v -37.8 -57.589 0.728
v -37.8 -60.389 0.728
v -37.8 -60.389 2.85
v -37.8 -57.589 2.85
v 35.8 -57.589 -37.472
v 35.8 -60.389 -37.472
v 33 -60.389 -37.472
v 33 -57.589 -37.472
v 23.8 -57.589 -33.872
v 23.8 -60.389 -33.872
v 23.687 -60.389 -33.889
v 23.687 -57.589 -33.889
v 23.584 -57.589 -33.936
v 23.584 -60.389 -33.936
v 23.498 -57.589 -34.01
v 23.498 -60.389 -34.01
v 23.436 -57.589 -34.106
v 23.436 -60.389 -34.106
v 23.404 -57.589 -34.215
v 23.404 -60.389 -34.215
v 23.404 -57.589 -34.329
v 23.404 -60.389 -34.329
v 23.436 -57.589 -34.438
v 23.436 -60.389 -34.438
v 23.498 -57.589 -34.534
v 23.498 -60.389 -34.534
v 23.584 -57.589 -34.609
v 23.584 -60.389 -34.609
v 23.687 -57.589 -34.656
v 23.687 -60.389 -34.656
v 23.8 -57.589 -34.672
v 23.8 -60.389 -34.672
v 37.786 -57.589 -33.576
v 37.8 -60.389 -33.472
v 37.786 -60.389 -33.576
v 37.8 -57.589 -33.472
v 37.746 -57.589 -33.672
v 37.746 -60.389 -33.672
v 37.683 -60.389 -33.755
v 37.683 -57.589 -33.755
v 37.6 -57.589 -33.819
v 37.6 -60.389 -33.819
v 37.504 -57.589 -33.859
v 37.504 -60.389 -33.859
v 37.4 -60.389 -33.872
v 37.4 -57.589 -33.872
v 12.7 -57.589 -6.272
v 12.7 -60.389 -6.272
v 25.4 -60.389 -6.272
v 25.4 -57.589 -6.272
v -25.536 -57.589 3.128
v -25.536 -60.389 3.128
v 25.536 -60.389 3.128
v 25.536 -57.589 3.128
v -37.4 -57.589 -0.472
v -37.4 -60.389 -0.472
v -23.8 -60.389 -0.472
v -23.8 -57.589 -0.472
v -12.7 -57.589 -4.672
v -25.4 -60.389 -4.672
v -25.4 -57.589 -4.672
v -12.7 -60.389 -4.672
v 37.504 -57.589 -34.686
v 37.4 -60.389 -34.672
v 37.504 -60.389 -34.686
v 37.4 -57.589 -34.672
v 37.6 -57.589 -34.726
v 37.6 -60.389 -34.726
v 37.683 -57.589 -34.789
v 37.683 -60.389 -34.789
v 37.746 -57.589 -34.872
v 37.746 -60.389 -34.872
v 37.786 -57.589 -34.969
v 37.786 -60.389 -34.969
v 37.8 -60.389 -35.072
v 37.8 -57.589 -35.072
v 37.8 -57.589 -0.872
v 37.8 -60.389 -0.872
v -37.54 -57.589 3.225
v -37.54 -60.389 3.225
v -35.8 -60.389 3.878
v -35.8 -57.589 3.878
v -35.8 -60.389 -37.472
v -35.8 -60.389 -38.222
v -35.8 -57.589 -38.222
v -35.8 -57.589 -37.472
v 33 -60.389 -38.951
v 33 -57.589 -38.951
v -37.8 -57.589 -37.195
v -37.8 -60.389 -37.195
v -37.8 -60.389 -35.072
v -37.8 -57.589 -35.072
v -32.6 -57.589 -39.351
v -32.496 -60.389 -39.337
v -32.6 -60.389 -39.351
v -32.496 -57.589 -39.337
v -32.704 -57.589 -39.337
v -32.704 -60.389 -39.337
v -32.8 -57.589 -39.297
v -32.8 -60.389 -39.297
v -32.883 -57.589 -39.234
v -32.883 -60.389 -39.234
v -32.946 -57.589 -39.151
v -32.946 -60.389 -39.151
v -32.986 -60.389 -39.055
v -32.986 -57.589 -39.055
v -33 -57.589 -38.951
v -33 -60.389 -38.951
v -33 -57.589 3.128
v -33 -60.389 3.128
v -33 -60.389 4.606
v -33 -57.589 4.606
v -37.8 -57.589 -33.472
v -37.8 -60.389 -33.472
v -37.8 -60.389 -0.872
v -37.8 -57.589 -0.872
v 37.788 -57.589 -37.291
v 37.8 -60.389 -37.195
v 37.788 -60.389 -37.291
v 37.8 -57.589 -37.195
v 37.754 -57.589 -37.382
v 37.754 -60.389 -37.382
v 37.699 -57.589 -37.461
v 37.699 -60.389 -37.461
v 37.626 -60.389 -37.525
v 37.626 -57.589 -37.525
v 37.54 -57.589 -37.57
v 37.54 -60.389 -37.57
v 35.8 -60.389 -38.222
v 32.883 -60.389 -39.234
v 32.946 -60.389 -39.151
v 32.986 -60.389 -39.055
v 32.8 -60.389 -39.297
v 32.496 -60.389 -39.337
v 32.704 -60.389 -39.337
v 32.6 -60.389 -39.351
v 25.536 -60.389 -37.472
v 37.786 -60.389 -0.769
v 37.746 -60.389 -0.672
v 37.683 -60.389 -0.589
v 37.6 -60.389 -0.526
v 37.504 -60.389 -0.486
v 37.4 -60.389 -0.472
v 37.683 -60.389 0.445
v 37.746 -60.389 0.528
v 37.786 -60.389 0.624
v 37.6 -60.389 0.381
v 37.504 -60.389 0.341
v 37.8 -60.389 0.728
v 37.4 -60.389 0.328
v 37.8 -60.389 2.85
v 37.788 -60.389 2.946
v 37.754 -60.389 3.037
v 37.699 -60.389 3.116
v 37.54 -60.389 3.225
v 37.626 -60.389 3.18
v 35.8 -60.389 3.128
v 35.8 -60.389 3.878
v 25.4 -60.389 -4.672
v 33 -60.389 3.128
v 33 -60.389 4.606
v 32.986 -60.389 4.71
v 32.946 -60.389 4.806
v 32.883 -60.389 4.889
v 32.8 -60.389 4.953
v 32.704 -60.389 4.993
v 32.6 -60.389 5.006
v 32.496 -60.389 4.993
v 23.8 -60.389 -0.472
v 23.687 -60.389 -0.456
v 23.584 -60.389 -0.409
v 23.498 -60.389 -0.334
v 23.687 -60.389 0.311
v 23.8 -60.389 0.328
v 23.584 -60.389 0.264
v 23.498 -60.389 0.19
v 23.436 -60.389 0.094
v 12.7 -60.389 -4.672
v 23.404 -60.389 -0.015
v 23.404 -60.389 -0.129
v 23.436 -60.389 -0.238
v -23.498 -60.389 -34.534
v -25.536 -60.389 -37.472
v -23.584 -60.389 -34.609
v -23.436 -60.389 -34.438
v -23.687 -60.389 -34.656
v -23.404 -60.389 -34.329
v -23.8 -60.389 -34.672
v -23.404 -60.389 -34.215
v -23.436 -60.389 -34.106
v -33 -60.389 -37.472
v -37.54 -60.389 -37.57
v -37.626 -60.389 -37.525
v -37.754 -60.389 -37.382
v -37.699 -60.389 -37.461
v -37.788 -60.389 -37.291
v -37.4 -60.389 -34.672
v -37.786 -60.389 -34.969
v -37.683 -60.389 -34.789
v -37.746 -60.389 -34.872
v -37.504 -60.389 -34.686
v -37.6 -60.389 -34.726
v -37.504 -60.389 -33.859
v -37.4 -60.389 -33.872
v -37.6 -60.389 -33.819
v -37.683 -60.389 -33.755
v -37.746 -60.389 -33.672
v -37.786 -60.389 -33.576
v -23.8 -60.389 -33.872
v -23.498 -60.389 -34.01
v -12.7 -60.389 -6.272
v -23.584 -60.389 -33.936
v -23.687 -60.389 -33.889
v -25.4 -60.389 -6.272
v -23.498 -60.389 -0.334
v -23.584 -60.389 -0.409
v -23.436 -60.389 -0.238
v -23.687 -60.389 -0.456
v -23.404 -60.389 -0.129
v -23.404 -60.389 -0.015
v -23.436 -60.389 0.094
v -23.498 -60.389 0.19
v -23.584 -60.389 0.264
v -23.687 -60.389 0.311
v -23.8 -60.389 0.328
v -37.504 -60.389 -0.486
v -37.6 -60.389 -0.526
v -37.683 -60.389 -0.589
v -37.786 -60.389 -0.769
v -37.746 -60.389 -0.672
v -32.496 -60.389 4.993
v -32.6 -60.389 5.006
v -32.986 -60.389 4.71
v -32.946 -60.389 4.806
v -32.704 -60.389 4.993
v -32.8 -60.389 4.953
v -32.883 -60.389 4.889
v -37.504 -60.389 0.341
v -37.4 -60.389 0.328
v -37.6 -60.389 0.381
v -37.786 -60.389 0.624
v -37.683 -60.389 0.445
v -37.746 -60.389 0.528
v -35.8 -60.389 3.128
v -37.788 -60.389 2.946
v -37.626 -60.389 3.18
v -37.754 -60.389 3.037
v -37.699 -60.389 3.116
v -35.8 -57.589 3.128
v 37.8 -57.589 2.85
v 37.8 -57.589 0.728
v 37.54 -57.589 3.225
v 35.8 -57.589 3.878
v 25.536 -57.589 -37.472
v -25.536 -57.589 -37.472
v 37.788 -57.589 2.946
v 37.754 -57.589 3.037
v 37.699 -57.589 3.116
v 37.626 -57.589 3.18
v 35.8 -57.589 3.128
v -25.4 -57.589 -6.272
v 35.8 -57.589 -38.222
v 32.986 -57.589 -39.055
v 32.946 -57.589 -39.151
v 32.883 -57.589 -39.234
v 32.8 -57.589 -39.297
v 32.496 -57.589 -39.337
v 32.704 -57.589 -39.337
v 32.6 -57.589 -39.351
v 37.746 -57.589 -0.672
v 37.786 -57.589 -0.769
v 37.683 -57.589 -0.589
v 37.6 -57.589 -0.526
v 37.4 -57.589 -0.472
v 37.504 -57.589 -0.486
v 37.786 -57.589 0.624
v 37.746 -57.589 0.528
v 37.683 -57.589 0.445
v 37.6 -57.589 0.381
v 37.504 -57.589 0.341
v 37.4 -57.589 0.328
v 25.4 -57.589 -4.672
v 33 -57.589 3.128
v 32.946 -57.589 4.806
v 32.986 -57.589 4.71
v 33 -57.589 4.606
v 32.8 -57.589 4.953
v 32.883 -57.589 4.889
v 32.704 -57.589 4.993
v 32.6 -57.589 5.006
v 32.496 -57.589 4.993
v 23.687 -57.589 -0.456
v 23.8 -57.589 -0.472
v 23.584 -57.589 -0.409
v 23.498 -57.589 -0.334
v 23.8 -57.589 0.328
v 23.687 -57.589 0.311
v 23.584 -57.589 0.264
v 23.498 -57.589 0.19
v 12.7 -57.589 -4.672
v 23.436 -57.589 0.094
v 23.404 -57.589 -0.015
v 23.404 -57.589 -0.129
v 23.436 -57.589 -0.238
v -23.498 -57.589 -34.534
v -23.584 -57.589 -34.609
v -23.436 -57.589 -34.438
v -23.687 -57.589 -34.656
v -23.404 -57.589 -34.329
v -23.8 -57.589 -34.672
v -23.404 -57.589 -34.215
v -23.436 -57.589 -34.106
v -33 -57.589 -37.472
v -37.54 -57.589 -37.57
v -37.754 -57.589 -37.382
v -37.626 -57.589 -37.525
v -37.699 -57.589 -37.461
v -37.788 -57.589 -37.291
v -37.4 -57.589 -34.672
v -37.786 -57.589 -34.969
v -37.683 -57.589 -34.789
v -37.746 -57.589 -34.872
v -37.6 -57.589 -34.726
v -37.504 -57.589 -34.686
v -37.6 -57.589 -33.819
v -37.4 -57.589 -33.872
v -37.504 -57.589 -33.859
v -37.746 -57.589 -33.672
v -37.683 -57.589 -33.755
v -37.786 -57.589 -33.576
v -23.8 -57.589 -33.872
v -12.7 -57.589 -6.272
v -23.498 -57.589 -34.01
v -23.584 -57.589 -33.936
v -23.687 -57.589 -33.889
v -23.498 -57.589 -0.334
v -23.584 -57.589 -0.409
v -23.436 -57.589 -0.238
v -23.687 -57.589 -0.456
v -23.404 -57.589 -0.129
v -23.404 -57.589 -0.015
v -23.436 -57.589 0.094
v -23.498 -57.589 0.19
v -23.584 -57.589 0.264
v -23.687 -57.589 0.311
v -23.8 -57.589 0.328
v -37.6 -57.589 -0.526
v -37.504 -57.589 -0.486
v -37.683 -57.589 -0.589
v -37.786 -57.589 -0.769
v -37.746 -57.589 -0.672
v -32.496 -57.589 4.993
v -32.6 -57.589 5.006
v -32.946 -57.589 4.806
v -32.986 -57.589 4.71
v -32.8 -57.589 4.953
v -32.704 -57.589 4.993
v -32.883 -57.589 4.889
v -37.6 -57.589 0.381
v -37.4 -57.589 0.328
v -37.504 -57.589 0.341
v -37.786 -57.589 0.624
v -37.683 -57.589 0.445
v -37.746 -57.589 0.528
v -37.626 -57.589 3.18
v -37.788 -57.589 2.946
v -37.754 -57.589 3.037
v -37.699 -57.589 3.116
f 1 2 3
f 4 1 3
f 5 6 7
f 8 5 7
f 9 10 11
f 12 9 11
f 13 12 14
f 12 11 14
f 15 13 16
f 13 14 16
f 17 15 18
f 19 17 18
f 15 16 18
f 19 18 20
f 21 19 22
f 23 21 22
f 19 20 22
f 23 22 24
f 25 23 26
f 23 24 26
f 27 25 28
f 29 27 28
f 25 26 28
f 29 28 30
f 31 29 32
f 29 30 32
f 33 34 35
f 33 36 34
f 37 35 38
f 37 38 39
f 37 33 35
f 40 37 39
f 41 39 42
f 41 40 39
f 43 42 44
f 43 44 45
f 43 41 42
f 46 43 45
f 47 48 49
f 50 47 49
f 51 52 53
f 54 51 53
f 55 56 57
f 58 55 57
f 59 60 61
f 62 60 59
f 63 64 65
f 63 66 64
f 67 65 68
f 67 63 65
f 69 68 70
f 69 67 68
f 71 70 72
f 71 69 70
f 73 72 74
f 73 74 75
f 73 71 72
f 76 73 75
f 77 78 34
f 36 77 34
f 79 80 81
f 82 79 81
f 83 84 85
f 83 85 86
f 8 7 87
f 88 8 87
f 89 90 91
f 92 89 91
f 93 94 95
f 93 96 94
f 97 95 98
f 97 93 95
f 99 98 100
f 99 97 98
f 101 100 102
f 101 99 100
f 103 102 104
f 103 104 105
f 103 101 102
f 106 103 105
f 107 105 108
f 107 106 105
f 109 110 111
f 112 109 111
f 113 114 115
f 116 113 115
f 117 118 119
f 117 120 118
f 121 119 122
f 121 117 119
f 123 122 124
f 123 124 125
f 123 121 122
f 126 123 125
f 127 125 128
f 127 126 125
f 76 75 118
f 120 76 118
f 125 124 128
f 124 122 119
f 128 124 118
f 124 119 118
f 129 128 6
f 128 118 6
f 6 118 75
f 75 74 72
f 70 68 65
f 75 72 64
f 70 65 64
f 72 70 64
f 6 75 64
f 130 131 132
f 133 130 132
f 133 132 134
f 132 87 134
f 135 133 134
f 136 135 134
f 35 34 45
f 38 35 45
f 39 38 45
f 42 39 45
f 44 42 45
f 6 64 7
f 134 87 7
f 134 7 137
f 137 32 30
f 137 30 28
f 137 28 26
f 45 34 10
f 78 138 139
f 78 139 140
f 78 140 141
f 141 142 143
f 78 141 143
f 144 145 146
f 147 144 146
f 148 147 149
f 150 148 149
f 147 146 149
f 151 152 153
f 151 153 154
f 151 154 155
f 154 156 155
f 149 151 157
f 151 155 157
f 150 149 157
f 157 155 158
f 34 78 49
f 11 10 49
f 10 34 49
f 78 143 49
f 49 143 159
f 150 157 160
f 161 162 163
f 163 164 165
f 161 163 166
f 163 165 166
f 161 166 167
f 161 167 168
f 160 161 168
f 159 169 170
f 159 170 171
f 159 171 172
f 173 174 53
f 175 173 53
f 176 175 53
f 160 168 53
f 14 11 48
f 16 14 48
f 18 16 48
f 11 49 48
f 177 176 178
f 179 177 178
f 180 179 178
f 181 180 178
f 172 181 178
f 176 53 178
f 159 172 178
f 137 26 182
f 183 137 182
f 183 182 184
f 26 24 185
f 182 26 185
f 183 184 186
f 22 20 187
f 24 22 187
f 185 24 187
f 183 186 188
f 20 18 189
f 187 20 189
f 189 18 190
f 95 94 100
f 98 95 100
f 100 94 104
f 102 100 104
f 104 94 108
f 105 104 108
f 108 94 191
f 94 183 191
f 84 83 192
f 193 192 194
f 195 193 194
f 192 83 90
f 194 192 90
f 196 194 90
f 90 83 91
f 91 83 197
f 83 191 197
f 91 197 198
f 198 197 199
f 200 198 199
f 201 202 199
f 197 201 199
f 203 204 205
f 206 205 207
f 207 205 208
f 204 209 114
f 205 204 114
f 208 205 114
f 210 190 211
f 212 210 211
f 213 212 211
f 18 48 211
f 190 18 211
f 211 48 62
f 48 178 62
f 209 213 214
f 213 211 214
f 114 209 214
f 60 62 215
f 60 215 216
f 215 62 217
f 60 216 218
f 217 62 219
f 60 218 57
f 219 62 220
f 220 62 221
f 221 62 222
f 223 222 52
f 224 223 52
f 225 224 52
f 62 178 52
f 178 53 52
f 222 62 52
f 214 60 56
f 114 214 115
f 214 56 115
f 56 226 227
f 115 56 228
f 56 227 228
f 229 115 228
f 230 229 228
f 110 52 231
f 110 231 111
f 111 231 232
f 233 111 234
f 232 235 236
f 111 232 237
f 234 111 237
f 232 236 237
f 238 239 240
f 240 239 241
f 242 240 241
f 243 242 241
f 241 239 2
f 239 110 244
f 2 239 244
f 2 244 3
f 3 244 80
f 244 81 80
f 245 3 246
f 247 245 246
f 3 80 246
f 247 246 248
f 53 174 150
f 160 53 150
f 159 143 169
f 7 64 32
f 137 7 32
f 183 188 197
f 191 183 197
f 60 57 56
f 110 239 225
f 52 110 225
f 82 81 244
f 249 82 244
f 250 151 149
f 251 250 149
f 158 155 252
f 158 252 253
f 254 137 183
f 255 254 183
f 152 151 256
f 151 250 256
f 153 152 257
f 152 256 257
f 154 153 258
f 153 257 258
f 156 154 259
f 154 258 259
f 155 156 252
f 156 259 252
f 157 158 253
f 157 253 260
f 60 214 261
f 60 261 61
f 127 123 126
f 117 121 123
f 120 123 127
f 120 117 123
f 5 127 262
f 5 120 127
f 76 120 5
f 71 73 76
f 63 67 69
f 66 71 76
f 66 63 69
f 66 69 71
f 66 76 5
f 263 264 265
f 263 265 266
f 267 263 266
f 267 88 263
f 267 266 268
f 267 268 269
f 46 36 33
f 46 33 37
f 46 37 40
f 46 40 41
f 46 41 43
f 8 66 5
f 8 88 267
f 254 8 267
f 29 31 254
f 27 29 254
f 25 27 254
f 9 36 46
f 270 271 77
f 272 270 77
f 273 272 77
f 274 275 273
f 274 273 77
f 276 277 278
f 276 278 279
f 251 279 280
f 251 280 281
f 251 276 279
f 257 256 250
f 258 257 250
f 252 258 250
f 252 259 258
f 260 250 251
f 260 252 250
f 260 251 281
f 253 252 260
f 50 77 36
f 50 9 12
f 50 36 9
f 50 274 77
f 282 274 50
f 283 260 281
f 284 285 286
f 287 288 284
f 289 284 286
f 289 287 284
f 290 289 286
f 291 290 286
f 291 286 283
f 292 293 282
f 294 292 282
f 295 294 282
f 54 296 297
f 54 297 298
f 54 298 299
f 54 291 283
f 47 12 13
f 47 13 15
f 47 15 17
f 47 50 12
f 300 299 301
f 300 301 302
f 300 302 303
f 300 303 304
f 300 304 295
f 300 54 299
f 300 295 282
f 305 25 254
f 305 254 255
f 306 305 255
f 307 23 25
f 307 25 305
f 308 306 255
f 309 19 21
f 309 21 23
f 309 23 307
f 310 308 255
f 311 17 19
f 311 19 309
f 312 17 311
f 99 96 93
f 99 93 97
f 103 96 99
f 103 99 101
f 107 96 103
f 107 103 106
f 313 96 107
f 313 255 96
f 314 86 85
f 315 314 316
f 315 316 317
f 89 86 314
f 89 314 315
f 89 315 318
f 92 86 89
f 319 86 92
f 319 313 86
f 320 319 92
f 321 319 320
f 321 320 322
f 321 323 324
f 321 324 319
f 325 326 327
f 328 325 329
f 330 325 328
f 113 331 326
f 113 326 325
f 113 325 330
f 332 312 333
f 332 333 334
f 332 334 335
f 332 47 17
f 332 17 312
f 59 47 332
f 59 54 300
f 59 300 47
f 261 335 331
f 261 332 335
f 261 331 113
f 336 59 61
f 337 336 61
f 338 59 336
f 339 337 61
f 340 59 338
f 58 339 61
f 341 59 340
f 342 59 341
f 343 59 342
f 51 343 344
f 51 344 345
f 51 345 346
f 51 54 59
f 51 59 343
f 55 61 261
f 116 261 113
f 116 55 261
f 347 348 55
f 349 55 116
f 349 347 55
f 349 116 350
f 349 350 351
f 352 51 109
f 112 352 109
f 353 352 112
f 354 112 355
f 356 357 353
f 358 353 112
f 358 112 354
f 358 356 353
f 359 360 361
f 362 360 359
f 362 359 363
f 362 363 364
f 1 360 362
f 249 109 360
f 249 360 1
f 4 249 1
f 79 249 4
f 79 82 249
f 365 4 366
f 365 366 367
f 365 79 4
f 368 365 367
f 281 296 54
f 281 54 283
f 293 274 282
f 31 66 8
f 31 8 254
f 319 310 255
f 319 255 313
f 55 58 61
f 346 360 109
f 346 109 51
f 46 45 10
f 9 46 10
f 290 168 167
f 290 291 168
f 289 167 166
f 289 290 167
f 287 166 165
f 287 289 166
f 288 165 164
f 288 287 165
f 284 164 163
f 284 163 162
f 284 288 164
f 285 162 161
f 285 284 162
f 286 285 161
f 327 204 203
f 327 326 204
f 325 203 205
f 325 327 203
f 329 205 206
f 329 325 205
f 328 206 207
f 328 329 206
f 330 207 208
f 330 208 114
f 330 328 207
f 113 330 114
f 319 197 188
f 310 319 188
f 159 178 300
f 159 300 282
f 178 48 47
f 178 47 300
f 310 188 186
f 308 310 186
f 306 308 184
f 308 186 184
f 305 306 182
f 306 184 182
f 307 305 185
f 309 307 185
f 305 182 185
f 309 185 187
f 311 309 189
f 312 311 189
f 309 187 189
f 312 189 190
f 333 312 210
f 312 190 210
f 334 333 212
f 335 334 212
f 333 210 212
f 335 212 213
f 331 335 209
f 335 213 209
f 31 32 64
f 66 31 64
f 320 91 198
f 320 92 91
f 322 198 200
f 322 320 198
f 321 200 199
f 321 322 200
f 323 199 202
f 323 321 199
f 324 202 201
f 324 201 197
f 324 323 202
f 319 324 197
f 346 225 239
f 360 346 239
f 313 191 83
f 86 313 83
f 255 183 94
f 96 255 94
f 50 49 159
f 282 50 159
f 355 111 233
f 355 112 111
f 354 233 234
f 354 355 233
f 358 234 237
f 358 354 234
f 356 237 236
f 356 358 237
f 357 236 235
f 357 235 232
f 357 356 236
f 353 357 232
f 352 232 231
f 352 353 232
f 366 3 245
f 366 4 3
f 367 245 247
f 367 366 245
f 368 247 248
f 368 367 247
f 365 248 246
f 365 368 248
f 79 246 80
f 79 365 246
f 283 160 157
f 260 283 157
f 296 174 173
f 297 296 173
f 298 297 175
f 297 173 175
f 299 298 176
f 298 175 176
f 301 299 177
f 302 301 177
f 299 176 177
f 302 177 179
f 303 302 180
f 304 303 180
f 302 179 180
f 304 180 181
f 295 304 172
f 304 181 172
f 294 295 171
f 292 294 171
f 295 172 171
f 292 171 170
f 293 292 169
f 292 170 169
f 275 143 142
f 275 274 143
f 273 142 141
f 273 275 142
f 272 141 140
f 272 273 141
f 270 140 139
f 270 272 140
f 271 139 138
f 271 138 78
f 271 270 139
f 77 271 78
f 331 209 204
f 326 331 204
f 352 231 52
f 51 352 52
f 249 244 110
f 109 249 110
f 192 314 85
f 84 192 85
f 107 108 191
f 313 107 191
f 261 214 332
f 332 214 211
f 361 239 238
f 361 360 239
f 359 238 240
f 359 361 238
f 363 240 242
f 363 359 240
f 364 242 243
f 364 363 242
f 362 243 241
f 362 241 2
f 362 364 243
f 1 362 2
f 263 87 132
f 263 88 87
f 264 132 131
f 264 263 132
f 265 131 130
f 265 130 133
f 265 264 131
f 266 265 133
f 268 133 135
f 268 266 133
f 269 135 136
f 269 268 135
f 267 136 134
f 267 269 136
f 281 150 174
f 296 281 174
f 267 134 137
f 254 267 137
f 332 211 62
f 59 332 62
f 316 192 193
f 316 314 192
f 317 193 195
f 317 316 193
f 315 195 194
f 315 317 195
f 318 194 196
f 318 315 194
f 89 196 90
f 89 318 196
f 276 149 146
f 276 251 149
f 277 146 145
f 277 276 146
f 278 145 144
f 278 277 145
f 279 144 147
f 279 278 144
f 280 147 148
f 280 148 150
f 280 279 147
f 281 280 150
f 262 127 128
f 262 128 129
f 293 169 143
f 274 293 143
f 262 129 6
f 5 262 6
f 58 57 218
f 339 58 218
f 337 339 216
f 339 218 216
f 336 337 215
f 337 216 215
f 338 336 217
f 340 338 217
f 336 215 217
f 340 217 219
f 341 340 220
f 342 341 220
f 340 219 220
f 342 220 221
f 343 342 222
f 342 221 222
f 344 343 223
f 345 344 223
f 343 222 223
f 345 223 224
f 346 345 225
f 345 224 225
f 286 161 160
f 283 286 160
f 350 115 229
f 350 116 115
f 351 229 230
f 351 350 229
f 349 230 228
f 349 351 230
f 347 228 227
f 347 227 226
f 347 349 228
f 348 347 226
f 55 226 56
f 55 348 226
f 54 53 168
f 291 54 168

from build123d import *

# Parameters (mm, degrees)
PAD009_DEPTH    = 2.8
FILLET004_R     = 0.4
SKETCH025_W     = 12.7
SKETCH025_H     = 1.6
POCKET014_DEPTH = 2.801


with BuildPart() as part:
    # Sketch009 (on Face6 of ShapeBinder008) → Pad009 (new body)
    with BuildSketch(Plane.XZ.offset(60.388718)):
        with BuildLine():
            Line((37.8, 3.127675), (37.8, 0.327675))
            Line((37.8, 0.327675), (23.8, 0.327675))
            ThreePointArc((23.8, 0.327675), (23.4, -0.072325), (23.8, -0.472325))
            Line((23.8, -0.472325), (37.8, -0.472325))
            Line((37.8, -0.472325), (37.8, -33.872325))
            Line((37.8, -33.872325), (23.8, -33.872325))
            ThreePointArc((23.8, -33.872325), (23.4, -34.272325), (23.8, -34.672325))
            Line((23.8, -34.672325), (37.8, -34.672325))
            Line((37.8, -34.672325), (37.8, -37.472325))
            Line((37.8, -37.472325), (35.8, -38.222325))
            Line((35.8, -38.222325), (35.8, -37.472325))
            Line((35.8, -37.472325), (33, -37.472325))
            Line((33, -37.472325), (33, -39.472325))
            Line((33, -39.472325), (25.535898, -37.472325))
            Line((25.535898, -37.472325), (-25.535898, -37.472325))
            Line((-25.535898, -37.472325), (-33, -39.472325))
            Line((-33, -39.472325), (-33, -37.472325))
            Line((-33, -37.472325), (-35.8, -37.472325))
            Line((-35.8, -38.222325), (-35.8, -37.472325))
            Line((-37.8, -37.472325), (-35.8, -38.222325))
            Line((-37.8, -37.472325), (-37.8, -34.672325))
            Line((-37.8, -34.672325), (-23.8, -34.672325))
            ThreePointArc((-23.8, -34.672325), (-23.4, -34.272325), (-23.8, -33.872325))
            Line((-23.8, -33.872325), (-37.8, -33.872325))
            Line((-37.8, -33.872325), (-37.8, -0.472325))
            Line((-37.8, -0.472325), (-23.8, -0.472325))
            ThreePointArc((-23.8, -0.472325), (-23.4, -0.072325), (-23.8, 0.327675))
            Line((-23.8, 0.327675), (-37.8, 0.327675))
            Line((-37.8, 0.327675), (-37.8, 3.127675))
            Line((-37.8, 3.127675), (-35.8, 3.877675))
            Line((-35.8, 3.877675), (-35.8, 3.127675))
            Line((-35.8, 3.127675), (-33, 3.127675))
            Line((-33, 3.127675), (-33, 5.127675))
            Line((-33, 5.127675), (-25.535898, 3.127675))
            Line((-25.535898, 3.127675), (25.535898, 3.127675))
            Line((25.535898, 3.127675), (33, 5.127675))
            Line((33, 5.127675), (33, 3.127675))
            Line((33, 3.127675), (35.8, 3.127675))
            Line((35.8, 3.877675), (35.8, 3.127675))
            Line((37.8, 3.127675), (35.8, 3.877675))
        make_face()
    extrude(amount=-PAD009_DEPTH)

    # Fillet004
    fillet004_edges = [part.edges().sort_by_distance(p)[0] for p in [
        (33, -58.988718, 5.127675),
        (37.8, -58.988718, 3.127675),
        (37.8, -58.988718, 0.327675),
        (37.8, -58.988718, -0.472325),
        (37.8, -58.988718, -33.872325),
        (37.8, -58.988718, -34.672325),
        (37.8, -58.988718, -37.472325),
        (33, -58.988718, -39.472325),
        (-37.8, -58.988718, -33.872325),
        (-37.8, -58.988718, -34.672325),
        (-37.8, -58.988718, -37.472325),
        (-33, -58.988718, -39.472325),
        (-33, -58.988718, 5.127675),
        (-37.8, -58.988718, 3.127675),
        (-37.8, -58.988718, 0.327675),
        (-37.8, -58.988718, -0.472325),
    ]]
    fillet(fillet004_edges, radius=FILLET004_R)

    # Sketch025 (on Face2 of Fillet004) → Pocket014 (cut, through all)
    with BuildSketch(Plane.XZ.offset(60.388718)):
        with Locations((-19.05, -5.472325)):
            Rectangle(SKETCH025_W, SKETCH025_H)
        with Locations((19.05, -5.472325)):
            Rectangle(SKETCH025_W, SKETCH025_H)
    extrude(amount=-POCKET014_DEPTH, mode=Mode.SUBTRACT)


solid = part.part
